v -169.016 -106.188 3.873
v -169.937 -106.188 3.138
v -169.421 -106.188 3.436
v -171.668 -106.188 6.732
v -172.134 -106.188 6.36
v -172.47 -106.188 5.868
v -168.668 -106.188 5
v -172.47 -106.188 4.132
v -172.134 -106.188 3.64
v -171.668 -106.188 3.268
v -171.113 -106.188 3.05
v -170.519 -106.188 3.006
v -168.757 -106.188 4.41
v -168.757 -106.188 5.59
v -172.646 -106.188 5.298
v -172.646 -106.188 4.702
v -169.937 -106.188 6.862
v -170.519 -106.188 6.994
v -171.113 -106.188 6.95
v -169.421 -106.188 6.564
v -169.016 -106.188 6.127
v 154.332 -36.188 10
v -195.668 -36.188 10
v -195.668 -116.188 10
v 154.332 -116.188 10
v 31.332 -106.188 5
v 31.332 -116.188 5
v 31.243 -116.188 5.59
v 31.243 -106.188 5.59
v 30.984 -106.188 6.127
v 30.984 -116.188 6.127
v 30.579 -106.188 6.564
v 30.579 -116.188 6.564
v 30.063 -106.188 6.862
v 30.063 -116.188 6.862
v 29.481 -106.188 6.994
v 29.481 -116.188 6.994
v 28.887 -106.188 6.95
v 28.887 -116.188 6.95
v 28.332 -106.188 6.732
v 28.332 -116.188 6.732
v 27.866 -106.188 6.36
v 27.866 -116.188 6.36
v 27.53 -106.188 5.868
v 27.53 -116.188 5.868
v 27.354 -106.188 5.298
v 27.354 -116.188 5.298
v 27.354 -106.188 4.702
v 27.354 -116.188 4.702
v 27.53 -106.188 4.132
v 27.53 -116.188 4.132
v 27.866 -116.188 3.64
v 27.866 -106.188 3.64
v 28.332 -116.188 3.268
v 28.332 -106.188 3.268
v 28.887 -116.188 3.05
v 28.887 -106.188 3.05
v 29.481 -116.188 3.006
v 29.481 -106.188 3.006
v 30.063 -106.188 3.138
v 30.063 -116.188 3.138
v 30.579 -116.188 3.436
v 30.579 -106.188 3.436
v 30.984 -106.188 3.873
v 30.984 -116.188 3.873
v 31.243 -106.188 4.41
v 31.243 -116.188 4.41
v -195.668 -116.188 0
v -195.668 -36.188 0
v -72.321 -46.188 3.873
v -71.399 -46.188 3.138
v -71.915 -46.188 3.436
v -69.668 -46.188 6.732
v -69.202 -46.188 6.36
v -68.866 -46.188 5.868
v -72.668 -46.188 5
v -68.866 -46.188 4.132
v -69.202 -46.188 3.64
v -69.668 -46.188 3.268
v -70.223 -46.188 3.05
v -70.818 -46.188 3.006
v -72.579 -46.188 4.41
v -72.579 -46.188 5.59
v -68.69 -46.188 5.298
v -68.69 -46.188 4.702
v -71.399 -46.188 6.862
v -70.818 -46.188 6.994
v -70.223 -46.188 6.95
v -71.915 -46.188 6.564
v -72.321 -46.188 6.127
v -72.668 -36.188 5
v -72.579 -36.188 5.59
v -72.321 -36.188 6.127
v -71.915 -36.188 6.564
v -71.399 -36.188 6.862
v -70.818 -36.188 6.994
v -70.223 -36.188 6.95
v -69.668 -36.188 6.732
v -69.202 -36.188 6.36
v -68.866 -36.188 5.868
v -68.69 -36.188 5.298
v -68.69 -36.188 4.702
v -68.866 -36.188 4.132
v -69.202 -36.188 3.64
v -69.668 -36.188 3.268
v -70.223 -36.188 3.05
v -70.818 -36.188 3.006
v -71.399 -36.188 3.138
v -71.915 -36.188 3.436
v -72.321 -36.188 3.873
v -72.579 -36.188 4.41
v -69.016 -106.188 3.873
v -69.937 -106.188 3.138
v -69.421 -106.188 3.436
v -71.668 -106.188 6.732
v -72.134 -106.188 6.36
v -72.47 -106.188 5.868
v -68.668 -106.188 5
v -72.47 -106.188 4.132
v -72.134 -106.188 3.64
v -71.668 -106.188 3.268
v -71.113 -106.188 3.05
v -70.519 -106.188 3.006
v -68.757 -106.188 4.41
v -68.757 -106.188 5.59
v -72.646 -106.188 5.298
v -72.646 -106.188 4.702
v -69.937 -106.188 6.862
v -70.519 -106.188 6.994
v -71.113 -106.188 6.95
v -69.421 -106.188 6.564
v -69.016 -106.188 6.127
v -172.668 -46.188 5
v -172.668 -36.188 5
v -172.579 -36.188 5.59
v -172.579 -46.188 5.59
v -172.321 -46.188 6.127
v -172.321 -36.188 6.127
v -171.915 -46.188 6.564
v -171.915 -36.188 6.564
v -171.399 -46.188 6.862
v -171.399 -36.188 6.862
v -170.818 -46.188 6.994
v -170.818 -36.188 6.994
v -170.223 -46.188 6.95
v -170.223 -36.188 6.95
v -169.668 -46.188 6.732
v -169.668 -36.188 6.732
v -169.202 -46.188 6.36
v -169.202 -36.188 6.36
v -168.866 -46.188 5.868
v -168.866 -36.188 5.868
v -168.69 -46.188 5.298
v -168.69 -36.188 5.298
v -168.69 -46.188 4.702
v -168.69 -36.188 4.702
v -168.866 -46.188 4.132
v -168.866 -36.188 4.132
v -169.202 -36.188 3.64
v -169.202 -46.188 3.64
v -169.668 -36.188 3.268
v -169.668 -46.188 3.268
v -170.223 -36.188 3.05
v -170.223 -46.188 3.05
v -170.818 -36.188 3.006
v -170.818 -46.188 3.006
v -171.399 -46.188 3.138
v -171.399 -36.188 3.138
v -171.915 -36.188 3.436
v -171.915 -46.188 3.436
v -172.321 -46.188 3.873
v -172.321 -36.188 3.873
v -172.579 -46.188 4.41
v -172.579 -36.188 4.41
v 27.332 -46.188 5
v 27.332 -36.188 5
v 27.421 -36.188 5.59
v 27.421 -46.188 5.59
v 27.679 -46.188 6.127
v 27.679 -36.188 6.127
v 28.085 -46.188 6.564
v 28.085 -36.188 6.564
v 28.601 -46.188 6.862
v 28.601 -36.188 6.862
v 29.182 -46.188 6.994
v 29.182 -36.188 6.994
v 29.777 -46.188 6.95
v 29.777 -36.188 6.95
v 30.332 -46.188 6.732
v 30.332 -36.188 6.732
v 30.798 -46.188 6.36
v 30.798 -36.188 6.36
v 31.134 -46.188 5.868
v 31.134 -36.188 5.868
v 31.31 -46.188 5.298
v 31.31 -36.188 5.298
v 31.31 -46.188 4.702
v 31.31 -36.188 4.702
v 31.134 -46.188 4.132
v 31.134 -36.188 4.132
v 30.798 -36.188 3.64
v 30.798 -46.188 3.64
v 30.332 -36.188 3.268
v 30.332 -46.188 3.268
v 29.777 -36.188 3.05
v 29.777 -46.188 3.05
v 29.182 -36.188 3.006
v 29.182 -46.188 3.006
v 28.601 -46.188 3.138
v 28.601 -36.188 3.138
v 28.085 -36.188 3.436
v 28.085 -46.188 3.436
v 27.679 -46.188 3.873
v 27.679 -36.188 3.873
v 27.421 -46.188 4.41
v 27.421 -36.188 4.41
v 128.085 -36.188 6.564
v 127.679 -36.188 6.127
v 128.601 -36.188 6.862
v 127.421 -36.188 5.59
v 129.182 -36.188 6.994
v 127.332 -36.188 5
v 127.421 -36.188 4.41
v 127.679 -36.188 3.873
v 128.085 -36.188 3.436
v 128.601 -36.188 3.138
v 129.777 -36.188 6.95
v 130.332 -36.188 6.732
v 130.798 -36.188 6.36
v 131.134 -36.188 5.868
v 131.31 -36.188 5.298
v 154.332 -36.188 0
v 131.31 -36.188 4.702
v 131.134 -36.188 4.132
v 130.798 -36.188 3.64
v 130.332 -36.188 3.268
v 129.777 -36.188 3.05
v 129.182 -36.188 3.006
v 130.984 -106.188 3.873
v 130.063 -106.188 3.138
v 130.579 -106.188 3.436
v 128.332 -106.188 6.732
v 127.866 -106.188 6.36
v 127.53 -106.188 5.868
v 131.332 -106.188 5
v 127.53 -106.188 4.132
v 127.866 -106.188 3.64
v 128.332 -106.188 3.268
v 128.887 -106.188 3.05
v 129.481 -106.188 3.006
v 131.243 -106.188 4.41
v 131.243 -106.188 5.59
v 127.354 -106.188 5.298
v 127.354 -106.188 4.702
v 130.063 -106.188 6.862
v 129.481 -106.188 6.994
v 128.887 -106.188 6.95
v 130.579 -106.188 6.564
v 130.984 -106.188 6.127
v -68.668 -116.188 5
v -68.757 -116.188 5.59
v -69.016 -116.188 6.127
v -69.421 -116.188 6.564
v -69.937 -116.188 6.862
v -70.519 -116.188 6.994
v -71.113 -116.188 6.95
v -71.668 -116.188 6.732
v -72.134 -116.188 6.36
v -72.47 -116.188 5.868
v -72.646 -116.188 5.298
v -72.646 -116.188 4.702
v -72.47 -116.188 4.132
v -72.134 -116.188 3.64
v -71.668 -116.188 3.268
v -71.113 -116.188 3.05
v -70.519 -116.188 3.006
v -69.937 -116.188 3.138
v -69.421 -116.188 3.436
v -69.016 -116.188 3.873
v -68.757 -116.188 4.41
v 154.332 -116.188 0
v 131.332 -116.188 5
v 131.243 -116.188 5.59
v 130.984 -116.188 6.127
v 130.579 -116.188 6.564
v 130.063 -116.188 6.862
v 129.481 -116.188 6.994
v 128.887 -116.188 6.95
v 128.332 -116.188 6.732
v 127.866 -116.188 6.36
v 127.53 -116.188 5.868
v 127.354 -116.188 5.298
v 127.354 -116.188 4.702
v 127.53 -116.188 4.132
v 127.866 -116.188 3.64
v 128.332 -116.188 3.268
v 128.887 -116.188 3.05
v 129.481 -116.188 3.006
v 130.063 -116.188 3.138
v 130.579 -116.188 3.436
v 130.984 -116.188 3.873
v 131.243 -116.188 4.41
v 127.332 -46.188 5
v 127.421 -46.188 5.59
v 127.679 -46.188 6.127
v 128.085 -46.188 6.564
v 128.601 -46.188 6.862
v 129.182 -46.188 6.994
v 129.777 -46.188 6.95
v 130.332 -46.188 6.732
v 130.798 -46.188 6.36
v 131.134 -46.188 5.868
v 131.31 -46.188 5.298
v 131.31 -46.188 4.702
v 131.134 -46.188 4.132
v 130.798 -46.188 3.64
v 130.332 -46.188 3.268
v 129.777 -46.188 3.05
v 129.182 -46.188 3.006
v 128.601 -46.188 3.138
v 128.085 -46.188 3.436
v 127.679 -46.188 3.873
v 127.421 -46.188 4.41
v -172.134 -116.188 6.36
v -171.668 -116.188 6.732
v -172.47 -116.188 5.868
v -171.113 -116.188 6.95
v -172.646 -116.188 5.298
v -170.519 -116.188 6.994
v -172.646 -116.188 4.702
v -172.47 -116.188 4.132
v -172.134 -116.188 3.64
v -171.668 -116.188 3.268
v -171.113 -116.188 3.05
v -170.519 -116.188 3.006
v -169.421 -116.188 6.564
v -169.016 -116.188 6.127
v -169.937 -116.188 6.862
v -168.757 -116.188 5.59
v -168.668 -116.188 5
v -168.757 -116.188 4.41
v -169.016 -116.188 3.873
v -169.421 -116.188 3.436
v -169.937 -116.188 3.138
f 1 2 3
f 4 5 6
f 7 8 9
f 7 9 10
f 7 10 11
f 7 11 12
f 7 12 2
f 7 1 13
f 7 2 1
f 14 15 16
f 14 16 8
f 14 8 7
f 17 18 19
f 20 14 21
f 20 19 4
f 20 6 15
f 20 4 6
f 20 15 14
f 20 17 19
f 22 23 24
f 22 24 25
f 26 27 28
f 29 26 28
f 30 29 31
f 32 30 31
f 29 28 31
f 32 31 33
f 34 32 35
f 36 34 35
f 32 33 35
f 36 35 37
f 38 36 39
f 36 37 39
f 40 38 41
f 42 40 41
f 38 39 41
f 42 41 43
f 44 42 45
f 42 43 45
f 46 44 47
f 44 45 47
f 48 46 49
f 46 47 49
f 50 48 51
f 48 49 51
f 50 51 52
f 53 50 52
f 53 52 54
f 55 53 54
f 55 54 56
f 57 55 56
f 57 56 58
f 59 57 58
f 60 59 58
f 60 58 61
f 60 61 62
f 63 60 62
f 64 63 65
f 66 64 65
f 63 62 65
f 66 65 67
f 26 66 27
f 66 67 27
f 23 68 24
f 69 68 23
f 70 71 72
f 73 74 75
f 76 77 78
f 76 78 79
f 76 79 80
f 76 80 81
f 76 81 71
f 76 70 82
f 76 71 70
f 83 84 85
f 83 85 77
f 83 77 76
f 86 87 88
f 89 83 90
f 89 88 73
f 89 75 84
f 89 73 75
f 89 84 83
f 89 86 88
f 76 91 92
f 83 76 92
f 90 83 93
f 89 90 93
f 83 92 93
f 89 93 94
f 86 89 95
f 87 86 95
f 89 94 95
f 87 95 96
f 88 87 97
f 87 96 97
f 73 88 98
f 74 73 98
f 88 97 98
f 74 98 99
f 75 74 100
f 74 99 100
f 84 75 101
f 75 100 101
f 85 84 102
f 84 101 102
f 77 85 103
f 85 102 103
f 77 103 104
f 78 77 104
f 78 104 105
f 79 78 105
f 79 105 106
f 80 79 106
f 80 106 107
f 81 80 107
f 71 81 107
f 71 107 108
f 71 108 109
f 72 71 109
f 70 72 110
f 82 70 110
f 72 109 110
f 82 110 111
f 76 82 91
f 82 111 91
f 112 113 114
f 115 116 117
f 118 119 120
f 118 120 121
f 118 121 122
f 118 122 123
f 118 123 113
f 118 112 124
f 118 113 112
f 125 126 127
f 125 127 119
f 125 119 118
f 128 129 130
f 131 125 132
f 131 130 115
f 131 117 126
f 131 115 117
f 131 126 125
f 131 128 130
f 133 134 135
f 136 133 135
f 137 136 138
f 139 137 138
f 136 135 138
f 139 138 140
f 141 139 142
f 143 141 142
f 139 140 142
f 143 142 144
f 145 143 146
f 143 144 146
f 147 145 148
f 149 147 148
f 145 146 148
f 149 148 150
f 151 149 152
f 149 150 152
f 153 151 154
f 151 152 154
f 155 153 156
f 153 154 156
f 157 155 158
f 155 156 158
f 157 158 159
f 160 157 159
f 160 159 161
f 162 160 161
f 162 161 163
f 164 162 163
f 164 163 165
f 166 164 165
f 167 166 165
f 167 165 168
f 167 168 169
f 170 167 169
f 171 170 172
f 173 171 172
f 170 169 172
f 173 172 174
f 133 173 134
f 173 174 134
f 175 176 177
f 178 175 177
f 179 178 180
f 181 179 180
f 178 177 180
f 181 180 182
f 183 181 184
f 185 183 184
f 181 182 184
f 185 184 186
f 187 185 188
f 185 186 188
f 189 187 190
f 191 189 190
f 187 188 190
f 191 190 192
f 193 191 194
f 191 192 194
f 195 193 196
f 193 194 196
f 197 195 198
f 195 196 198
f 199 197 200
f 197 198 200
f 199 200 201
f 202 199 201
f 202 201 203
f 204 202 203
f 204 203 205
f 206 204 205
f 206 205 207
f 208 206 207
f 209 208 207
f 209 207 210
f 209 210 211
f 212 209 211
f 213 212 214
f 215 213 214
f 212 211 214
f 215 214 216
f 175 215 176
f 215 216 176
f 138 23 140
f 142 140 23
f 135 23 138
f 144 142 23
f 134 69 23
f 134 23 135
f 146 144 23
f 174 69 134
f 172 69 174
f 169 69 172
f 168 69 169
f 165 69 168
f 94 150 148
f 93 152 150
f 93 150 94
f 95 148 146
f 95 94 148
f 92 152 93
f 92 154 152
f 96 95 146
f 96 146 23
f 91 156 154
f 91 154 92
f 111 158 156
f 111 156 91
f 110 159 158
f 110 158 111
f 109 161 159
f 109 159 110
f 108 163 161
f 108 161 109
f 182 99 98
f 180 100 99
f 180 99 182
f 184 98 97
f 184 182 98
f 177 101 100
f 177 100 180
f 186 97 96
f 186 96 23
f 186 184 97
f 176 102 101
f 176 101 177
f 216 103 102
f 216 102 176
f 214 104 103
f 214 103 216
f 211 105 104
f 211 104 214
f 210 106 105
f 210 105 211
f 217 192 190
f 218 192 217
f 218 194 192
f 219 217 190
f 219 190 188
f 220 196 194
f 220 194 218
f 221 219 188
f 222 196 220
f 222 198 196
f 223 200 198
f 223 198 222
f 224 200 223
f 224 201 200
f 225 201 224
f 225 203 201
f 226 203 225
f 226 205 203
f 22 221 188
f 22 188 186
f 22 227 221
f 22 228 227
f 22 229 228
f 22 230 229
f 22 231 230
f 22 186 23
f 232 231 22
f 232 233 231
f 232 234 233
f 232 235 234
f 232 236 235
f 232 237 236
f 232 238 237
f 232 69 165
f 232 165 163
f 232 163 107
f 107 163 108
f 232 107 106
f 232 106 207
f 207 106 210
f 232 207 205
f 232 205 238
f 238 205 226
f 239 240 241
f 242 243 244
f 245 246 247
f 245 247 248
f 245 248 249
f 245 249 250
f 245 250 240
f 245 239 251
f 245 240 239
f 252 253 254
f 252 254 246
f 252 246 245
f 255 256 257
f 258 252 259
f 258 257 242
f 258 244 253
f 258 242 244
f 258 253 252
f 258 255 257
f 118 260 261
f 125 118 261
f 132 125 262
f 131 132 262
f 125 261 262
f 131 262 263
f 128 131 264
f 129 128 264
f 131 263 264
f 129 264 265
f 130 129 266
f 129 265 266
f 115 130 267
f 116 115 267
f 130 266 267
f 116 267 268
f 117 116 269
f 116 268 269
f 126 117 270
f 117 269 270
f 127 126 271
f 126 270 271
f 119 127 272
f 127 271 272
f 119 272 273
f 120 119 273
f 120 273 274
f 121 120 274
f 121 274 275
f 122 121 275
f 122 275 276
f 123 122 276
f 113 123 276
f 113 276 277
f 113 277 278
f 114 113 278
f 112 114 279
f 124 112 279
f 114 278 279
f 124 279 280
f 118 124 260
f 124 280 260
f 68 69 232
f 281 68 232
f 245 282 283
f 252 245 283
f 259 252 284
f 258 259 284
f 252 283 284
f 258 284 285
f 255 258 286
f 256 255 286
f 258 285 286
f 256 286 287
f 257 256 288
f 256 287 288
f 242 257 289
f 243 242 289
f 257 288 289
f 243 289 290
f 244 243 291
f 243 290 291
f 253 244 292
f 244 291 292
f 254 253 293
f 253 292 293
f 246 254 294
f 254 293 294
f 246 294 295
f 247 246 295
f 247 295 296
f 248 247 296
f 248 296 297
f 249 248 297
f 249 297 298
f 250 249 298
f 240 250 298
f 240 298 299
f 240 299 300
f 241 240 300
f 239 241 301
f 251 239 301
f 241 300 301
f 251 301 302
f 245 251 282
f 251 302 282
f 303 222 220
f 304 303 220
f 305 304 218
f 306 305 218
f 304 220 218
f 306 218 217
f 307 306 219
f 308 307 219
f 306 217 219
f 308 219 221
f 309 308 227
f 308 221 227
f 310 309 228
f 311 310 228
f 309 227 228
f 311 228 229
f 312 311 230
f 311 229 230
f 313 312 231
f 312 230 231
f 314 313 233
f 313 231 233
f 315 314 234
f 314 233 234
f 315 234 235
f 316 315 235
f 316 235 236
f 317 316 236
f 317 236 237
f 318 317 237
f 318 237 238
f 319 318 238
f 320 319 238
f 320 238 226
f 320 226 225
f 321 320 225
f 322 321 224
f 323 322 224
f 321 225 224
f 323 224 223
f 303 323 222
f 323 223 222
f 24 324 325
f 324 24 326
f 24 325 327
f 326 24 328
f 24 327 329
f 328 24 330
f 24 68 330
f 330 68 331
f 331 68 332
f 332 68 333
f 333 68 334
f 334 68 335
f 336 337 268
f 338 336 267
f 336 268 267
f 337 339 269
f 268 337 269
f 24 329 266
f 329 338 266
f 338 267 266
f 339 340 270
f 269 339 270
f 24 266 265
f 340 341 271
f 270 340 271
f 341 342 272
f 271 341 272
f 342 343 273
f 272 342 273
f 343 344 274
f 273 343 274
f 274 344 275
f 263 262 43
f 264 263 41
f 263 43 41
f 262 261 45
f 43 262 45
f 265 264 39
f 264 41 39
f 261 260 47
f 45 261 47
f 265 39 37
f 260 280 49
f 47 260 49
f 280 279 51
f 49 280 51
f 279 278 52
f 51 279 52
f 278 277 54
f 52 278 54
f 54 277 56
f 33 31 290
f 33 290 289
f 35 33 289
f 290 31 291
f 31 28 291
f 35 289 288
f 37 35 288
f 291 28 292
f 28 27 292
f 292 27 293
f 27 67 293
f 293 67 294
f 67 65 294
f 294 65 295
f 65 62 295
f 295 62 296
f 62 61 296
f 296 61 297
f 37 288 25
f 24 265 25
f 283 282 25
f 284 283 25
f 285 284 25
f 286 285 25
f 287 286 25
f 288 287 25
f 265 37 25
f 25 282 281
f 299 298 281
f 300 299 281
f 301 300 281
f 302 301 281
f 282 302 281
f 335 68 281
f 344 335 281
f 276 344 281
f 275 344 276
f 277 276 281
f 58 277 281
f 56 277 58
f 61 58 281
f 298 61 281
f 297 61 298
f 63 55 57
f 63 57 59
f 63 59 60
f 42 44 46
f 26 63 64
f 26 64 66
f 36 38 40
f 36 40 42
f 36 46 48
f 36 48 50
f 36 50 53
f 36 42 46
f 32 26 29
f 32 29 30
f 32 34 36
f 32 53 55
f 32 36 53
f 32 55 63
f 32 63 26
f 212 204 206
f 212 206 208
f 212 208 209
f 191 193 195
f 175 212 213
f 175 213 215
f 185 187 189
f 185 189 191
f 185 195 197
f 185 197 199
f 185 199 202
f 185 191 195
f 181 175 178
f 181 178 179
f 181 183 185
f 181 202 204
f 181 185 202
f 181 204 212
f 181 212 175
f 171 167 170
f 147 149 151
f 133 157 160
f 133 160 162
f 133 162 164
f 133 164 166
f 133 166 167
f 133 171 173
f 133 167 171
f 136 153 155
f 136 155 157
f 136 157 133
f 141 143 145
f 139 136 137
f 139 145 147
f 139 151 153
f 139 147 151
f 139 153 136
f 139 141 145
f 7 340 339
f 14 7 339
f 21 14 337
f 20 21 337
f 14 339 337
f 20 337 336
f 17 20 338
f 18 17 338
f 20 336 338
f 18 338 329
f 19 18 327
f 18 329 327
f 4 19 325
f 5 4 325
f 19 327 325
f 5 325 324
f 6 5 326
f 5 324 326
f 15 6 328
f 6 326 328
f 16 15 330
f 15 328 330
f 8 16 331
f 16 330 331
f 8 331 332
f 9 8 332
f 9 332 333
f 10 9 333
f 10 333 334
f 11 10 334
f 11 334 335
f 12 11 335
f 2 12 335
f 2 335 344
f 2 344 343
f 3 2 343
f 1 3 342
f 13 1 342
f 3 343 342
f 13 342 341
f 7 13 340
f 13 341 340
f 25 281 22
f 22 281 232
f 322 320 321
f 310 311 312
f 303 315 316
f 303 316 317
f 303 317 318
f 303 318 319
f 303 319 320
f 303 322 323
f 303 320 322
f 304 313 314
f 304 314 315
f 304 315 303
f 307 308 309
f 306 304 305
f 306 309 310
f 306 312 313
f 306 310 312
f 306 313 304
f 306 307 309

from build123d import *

# Parameters (mm, degrees)
F0_W     = 350
F0_H     = 80
F1_DEPTH = 10
F2_R     = 2
F3_DEPTH = 10
F4_R     = 2
F5_DEPTH = 10


with BuildPart() as f1:
    # F0 (on Top) → F1 (new body)
    with BuildSketch(Plane.XY):
        with Locations((-20.668104, -76.187617)):
            Rectangle(F0_W, F0_H)
    extrude(amount=F1_DEPTH)

    # F2 (on face) → F3 (cut)
    with BuildSketch(Plane.XZ.offset(116.187617)):
        with Locations((-170.668104, 5)):
            Circle(F2_R)
        with Locations((-70.668104, 5)):
            Circle(F2_R)
        with Locations((29.331896, 5)):
            Circle(F2_R)
        with Locations((129.331896, 5)):
            Circle(F2_R)
    extrude(amount=-F3_DEPTH, mode=Mode.SUBTRACT)

    # F4 (on face) → F5 (cut)
    with BuildSketch(Plane(origin=(0, -36.187617, 0), x_dir=(-1, 0, 0), z_dir=(0, 1, 0))):
        with Locations((170.668104, 5)):
            Circle(F4_R)
        with Locations((70.668104, 5)):
            Circle(F4_R)
        with Locations((-29.331896, 5)):
            Circle(F4_R)
        with Locations((-129.331896, 5)):
            Circle(F4_R)
    extrude(amount=-F5_DEPTH, mode=Mode.SUBTRACT)


solid = f1.part
